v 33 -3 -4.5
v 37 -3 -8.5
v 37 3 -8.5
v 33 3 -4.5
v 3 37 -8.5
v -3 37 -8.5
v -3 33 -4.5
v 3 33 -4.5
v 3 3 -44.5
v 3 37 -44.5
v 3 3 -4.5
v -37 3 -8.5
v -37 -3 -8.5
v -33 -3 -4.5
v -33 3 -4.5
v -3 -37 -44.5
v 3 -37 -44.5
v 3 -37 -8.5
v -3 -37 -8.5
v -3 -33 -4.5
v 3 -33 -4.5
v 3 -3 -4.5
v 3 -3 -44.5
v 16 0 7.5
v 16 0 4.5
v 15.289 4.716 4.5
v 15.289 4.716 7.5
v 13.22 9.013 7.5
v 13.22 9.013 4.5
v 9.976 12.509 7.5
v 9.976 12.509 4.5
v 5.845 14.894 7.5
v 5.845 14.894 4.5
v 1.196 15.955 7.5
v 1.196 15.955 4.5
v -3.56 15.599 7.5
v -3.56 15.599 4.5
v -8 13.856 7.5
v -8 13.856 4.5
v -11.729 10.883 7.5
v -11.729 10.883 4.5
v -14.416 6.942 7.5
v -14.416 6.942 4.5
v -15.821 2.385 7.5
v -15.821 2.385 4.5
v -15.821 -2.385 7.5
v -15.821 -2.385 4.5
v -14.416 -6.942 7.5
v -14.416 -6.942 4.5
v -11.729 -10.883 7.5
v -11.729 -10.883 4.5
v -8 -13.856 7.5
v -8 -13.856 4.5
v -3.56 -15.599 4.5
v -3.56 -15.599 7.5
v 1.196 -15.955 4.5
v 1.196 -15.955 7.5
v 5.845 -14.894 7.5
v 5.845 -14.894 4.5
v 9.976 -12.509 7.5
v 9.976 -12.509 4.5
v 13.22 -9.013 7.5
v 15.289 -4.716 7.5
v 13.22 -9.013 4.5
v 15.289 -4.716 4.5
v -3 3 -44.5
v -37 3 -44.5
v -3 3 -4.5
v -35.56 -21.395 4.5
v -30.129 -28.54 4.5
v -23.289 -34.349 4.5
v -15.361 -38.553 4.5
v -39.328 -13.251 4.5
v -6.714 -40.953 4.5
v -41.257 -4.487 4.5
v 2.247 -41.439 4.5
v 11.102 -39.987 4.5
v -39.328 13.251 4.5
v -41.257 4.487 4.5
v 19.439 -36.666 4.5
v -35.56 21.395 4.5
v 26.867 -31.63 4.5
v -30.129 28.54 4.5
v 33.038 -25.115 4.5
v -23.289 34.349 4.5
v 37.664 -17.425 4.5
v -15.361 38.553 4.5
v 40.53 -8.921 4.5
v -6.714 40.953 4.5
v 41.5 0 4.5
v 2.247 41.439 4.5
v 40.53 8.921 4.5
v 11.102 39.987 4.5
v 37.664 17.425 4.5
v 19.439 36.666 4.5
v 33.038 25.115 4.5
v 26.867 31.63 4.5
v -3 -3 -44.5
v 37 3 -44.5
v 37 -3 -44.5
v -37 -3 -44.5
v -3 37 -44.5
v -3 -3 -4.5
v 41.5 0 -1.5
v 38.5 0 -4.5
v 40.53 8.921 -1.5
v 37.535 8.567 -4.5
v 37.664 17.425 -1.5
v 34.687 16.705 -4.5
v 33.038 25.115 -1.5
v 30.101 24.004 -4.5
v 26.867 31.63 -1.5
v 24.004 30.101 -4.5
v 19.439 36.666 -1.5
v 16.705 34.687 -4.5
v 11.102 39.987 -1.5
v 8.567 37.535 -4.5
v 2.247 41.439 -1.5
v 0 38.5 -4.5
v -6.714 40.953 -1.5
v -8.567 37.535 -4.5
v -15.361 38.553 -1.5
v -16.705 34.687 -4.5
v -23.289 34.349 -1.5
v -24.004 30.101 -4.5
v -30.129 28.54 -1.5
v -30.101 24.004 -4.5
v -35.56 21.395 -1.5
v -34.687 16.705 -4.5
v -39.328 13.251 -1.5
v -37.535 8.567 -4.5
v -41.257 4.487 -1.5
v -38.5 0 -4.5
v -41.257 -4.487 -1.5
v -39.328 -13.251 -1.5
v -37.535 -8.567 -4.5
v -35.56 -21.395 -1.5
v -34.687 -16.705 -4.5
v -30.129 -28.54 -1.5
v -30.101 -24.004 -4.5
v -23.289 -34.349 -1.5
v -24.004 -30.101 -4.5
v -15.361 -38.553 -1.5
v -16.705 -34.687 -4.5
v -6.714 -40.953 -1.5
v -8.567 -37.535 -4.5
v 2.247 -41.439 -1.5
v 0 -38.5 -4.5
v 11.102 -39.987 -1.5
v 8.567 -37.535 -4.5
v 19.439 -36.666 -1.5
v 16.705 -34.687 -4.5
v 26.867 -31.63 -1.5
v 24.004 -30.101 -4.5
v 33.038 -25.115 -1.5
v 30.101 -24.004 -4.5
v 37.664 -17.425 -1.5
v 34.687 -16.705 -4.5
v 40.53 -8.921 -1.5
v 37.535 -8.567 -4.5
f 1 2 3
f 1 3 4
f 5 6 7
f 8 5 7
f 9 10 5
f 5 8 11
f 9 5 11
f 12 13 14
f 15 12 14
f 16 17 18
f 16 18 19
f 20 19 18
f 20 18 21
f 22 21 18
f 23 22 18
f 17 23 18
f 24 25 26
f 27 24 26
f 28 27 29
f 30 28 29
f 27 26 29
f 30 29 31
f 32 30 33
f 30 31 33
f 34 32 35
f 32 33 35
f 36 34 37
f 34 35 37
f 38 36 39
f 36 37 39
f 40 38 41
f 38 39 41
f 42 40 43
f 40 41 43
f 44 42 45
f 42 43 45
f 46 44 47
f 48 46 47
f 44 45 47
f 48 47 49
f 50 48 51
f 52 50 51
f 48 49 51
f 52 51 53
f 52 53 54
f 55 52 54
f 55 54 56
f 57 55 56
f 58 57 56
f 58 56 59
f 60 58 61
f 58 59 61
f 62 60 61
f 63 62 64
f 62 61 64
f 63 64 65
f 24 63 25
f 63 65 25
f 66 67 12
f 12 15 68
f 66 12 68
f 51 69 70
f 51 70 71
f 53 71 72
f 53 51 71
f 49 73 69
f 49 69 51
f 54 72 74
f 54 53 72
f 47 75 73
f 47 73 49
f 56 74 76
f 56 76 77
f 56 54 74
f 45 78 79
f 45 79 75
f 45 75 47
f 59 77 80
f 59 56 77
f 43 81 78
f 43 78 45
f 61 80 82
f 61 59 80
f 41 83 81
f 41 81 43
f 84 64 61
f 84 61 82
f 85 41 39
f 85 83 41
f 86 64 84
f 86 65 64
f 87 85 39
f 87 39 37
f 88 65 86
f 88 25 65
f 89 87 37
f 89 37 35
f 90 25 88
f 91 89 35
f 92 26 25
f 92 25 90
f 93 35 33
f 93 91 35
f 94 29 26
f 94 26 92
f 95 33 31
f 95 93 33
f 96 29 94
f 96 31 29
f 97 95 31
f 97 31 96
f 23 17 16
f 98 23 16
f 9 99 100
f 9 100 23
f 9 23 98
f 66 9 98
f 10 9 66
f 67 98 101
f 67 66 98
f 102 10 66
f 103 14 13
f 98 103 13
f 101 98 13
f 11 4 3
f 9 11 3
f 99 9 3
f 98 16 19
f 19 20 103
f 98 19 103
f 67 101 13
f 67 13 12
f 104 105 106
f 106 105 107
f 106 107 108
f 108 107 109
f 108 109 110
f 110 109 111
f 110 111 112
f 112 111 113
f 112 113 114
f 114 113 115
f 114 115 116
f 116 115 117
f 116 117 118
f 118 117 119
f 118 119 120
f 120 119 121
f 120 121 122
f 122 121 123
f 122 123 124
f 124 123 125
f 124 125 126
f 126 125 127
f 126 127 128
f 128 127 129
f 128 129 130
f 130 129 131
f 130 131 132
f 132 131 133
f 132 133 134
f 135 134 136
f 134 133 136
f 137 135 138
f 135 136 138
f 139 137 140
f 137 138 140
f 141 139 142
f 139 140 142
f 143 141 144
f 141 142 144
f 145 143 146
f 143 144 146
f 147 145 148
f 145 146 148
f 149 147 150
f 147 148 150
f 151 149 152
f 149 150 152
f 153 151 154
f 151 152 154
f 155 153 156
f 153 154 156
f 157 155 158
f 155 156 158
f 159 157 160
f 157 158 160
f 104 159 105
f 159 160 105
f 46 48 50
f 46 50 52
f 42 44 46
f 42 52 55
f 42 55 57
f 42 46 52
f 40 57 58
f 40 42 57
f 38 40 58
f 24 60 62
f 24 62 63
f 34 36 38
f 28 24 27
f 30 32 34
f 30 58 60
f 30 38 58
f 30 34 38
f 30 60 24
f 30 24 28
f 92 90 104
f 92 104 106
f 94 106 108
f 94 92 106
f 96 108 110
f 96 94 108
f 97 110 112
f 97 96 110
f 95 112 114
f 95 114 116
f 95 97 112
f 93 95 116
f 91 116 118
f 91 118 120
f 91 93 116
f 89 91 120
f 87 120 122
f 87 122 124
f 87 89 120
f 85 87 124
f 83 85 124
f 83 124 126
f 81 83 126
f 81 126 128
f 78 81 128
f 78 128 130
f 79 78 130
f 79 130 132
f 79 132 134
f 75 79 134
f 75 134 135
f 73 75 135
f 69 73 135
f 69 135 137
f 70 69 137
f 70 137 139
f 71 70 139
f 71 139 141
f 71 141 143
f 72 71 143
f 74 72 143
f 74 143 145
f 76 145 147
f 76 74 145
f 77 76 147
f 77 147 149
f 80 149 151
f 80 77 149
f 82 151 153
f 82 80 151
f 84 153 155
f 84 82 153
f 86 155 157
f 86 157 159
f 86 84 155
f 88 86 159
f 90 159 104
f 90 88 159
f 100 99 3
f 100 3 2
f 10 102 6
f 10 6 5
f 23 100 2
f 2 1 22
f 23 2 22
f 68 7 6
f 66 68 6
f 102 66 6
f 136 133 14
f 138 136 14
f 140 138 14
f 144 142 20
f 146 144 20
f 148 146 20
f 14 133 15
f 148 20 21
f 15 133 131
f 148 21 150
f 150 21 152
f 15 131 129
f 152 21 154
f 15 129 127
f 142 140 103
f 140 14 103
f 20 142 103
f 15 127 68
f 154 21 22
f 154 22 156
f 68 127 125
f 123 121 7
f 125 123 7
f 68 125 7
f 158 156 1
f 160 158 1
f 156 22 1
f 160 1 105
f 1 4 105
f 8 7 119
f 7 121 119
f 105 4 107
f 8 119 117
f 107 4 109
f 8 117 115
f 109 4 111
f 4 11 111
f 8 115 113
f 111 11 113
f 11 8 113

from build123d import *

# Parameters (mm, degrees)
SKETCH1_R           = 41.5
BOSS_EXTRUDE1_DEPTH = 4.5
CHAMFER1_SIZE       = 3
SKETCH3_R           = 16
BOSS_EXTRUDE2_DEPTH = 3
BOSS_EXTRUDE3_DEPTH = 40
CUT_EXTRUDE1_DEPTH  = 76.384016874
CIRPATTERN1_COUNT   = 4


with BuildPart() as part:
    # Sketch1 → Boss-Extrude1 (new, symmetric)
    with BuildSketch(Plane.XY):
        Circle(SKETCH1_R)
    extrude(amount=BOSS_EXTRUDE1_DEPTH, both=True)

    # Chamfer1
    chamfer1_edges = [part.edges().sort_by_distance(p)[0] for p in [
        (-41.5, 0, -4.5),
    ]]
    chamfer(chamfer1_edges, length=CHAMFER1_SIZE)

    # Sketch3 → Boss-Extrude2 (add)
    with BuildSketch(Plane.XY.offset(4.5)):
        Circle(SKETCH3_R)
    extrude(amount=BOSS_EXTRUDE2_DEPTH)

    # Sketch4 → Boss-Extrude3 (add)
    with BuildSketch(Plane(origin=(0, 0, -4.5), x_dir=(-1, 0, 0), z_dir=(0, 0, -1))):
        Polygon((3, -37), (3, -3), (37, -3), (37, 3), (3, 3), (3, 37), (-3, 37), (-3, 3), (-37, 3), (-37, -3), (-3, -3), (-3, -37), align=None)
    extrude(amount=BOSS_EXTRUDE3_DEPTH)

    # Sketch5 → Cut-Extrude1 (cut, symmetric)
    with BuildSketch(Plane.XZ.offset(3)):
        Polygon((37, -4.5), (37, -8.5), (33, -4.5), align=None)
    cut_extrude1 = extrude(amount=CUT_EXTRUDE1_DEPTH, both=True, mode=Mode.SUBTRACT)

    # CirPattern1: Cut-Extrude1 ×4 about axis
    cirpattern1_axis = Axis((0, 0, 0), (0, 0, 1))
    for i in range(1, CIRPATTERN1_COUNT):
        add(cut_extrude1.rotate(cirpattern1_axis, i * 360 / CIRPATTERN1_COUNT), mode=Mode.SUBTRACT)


solid = part.part
